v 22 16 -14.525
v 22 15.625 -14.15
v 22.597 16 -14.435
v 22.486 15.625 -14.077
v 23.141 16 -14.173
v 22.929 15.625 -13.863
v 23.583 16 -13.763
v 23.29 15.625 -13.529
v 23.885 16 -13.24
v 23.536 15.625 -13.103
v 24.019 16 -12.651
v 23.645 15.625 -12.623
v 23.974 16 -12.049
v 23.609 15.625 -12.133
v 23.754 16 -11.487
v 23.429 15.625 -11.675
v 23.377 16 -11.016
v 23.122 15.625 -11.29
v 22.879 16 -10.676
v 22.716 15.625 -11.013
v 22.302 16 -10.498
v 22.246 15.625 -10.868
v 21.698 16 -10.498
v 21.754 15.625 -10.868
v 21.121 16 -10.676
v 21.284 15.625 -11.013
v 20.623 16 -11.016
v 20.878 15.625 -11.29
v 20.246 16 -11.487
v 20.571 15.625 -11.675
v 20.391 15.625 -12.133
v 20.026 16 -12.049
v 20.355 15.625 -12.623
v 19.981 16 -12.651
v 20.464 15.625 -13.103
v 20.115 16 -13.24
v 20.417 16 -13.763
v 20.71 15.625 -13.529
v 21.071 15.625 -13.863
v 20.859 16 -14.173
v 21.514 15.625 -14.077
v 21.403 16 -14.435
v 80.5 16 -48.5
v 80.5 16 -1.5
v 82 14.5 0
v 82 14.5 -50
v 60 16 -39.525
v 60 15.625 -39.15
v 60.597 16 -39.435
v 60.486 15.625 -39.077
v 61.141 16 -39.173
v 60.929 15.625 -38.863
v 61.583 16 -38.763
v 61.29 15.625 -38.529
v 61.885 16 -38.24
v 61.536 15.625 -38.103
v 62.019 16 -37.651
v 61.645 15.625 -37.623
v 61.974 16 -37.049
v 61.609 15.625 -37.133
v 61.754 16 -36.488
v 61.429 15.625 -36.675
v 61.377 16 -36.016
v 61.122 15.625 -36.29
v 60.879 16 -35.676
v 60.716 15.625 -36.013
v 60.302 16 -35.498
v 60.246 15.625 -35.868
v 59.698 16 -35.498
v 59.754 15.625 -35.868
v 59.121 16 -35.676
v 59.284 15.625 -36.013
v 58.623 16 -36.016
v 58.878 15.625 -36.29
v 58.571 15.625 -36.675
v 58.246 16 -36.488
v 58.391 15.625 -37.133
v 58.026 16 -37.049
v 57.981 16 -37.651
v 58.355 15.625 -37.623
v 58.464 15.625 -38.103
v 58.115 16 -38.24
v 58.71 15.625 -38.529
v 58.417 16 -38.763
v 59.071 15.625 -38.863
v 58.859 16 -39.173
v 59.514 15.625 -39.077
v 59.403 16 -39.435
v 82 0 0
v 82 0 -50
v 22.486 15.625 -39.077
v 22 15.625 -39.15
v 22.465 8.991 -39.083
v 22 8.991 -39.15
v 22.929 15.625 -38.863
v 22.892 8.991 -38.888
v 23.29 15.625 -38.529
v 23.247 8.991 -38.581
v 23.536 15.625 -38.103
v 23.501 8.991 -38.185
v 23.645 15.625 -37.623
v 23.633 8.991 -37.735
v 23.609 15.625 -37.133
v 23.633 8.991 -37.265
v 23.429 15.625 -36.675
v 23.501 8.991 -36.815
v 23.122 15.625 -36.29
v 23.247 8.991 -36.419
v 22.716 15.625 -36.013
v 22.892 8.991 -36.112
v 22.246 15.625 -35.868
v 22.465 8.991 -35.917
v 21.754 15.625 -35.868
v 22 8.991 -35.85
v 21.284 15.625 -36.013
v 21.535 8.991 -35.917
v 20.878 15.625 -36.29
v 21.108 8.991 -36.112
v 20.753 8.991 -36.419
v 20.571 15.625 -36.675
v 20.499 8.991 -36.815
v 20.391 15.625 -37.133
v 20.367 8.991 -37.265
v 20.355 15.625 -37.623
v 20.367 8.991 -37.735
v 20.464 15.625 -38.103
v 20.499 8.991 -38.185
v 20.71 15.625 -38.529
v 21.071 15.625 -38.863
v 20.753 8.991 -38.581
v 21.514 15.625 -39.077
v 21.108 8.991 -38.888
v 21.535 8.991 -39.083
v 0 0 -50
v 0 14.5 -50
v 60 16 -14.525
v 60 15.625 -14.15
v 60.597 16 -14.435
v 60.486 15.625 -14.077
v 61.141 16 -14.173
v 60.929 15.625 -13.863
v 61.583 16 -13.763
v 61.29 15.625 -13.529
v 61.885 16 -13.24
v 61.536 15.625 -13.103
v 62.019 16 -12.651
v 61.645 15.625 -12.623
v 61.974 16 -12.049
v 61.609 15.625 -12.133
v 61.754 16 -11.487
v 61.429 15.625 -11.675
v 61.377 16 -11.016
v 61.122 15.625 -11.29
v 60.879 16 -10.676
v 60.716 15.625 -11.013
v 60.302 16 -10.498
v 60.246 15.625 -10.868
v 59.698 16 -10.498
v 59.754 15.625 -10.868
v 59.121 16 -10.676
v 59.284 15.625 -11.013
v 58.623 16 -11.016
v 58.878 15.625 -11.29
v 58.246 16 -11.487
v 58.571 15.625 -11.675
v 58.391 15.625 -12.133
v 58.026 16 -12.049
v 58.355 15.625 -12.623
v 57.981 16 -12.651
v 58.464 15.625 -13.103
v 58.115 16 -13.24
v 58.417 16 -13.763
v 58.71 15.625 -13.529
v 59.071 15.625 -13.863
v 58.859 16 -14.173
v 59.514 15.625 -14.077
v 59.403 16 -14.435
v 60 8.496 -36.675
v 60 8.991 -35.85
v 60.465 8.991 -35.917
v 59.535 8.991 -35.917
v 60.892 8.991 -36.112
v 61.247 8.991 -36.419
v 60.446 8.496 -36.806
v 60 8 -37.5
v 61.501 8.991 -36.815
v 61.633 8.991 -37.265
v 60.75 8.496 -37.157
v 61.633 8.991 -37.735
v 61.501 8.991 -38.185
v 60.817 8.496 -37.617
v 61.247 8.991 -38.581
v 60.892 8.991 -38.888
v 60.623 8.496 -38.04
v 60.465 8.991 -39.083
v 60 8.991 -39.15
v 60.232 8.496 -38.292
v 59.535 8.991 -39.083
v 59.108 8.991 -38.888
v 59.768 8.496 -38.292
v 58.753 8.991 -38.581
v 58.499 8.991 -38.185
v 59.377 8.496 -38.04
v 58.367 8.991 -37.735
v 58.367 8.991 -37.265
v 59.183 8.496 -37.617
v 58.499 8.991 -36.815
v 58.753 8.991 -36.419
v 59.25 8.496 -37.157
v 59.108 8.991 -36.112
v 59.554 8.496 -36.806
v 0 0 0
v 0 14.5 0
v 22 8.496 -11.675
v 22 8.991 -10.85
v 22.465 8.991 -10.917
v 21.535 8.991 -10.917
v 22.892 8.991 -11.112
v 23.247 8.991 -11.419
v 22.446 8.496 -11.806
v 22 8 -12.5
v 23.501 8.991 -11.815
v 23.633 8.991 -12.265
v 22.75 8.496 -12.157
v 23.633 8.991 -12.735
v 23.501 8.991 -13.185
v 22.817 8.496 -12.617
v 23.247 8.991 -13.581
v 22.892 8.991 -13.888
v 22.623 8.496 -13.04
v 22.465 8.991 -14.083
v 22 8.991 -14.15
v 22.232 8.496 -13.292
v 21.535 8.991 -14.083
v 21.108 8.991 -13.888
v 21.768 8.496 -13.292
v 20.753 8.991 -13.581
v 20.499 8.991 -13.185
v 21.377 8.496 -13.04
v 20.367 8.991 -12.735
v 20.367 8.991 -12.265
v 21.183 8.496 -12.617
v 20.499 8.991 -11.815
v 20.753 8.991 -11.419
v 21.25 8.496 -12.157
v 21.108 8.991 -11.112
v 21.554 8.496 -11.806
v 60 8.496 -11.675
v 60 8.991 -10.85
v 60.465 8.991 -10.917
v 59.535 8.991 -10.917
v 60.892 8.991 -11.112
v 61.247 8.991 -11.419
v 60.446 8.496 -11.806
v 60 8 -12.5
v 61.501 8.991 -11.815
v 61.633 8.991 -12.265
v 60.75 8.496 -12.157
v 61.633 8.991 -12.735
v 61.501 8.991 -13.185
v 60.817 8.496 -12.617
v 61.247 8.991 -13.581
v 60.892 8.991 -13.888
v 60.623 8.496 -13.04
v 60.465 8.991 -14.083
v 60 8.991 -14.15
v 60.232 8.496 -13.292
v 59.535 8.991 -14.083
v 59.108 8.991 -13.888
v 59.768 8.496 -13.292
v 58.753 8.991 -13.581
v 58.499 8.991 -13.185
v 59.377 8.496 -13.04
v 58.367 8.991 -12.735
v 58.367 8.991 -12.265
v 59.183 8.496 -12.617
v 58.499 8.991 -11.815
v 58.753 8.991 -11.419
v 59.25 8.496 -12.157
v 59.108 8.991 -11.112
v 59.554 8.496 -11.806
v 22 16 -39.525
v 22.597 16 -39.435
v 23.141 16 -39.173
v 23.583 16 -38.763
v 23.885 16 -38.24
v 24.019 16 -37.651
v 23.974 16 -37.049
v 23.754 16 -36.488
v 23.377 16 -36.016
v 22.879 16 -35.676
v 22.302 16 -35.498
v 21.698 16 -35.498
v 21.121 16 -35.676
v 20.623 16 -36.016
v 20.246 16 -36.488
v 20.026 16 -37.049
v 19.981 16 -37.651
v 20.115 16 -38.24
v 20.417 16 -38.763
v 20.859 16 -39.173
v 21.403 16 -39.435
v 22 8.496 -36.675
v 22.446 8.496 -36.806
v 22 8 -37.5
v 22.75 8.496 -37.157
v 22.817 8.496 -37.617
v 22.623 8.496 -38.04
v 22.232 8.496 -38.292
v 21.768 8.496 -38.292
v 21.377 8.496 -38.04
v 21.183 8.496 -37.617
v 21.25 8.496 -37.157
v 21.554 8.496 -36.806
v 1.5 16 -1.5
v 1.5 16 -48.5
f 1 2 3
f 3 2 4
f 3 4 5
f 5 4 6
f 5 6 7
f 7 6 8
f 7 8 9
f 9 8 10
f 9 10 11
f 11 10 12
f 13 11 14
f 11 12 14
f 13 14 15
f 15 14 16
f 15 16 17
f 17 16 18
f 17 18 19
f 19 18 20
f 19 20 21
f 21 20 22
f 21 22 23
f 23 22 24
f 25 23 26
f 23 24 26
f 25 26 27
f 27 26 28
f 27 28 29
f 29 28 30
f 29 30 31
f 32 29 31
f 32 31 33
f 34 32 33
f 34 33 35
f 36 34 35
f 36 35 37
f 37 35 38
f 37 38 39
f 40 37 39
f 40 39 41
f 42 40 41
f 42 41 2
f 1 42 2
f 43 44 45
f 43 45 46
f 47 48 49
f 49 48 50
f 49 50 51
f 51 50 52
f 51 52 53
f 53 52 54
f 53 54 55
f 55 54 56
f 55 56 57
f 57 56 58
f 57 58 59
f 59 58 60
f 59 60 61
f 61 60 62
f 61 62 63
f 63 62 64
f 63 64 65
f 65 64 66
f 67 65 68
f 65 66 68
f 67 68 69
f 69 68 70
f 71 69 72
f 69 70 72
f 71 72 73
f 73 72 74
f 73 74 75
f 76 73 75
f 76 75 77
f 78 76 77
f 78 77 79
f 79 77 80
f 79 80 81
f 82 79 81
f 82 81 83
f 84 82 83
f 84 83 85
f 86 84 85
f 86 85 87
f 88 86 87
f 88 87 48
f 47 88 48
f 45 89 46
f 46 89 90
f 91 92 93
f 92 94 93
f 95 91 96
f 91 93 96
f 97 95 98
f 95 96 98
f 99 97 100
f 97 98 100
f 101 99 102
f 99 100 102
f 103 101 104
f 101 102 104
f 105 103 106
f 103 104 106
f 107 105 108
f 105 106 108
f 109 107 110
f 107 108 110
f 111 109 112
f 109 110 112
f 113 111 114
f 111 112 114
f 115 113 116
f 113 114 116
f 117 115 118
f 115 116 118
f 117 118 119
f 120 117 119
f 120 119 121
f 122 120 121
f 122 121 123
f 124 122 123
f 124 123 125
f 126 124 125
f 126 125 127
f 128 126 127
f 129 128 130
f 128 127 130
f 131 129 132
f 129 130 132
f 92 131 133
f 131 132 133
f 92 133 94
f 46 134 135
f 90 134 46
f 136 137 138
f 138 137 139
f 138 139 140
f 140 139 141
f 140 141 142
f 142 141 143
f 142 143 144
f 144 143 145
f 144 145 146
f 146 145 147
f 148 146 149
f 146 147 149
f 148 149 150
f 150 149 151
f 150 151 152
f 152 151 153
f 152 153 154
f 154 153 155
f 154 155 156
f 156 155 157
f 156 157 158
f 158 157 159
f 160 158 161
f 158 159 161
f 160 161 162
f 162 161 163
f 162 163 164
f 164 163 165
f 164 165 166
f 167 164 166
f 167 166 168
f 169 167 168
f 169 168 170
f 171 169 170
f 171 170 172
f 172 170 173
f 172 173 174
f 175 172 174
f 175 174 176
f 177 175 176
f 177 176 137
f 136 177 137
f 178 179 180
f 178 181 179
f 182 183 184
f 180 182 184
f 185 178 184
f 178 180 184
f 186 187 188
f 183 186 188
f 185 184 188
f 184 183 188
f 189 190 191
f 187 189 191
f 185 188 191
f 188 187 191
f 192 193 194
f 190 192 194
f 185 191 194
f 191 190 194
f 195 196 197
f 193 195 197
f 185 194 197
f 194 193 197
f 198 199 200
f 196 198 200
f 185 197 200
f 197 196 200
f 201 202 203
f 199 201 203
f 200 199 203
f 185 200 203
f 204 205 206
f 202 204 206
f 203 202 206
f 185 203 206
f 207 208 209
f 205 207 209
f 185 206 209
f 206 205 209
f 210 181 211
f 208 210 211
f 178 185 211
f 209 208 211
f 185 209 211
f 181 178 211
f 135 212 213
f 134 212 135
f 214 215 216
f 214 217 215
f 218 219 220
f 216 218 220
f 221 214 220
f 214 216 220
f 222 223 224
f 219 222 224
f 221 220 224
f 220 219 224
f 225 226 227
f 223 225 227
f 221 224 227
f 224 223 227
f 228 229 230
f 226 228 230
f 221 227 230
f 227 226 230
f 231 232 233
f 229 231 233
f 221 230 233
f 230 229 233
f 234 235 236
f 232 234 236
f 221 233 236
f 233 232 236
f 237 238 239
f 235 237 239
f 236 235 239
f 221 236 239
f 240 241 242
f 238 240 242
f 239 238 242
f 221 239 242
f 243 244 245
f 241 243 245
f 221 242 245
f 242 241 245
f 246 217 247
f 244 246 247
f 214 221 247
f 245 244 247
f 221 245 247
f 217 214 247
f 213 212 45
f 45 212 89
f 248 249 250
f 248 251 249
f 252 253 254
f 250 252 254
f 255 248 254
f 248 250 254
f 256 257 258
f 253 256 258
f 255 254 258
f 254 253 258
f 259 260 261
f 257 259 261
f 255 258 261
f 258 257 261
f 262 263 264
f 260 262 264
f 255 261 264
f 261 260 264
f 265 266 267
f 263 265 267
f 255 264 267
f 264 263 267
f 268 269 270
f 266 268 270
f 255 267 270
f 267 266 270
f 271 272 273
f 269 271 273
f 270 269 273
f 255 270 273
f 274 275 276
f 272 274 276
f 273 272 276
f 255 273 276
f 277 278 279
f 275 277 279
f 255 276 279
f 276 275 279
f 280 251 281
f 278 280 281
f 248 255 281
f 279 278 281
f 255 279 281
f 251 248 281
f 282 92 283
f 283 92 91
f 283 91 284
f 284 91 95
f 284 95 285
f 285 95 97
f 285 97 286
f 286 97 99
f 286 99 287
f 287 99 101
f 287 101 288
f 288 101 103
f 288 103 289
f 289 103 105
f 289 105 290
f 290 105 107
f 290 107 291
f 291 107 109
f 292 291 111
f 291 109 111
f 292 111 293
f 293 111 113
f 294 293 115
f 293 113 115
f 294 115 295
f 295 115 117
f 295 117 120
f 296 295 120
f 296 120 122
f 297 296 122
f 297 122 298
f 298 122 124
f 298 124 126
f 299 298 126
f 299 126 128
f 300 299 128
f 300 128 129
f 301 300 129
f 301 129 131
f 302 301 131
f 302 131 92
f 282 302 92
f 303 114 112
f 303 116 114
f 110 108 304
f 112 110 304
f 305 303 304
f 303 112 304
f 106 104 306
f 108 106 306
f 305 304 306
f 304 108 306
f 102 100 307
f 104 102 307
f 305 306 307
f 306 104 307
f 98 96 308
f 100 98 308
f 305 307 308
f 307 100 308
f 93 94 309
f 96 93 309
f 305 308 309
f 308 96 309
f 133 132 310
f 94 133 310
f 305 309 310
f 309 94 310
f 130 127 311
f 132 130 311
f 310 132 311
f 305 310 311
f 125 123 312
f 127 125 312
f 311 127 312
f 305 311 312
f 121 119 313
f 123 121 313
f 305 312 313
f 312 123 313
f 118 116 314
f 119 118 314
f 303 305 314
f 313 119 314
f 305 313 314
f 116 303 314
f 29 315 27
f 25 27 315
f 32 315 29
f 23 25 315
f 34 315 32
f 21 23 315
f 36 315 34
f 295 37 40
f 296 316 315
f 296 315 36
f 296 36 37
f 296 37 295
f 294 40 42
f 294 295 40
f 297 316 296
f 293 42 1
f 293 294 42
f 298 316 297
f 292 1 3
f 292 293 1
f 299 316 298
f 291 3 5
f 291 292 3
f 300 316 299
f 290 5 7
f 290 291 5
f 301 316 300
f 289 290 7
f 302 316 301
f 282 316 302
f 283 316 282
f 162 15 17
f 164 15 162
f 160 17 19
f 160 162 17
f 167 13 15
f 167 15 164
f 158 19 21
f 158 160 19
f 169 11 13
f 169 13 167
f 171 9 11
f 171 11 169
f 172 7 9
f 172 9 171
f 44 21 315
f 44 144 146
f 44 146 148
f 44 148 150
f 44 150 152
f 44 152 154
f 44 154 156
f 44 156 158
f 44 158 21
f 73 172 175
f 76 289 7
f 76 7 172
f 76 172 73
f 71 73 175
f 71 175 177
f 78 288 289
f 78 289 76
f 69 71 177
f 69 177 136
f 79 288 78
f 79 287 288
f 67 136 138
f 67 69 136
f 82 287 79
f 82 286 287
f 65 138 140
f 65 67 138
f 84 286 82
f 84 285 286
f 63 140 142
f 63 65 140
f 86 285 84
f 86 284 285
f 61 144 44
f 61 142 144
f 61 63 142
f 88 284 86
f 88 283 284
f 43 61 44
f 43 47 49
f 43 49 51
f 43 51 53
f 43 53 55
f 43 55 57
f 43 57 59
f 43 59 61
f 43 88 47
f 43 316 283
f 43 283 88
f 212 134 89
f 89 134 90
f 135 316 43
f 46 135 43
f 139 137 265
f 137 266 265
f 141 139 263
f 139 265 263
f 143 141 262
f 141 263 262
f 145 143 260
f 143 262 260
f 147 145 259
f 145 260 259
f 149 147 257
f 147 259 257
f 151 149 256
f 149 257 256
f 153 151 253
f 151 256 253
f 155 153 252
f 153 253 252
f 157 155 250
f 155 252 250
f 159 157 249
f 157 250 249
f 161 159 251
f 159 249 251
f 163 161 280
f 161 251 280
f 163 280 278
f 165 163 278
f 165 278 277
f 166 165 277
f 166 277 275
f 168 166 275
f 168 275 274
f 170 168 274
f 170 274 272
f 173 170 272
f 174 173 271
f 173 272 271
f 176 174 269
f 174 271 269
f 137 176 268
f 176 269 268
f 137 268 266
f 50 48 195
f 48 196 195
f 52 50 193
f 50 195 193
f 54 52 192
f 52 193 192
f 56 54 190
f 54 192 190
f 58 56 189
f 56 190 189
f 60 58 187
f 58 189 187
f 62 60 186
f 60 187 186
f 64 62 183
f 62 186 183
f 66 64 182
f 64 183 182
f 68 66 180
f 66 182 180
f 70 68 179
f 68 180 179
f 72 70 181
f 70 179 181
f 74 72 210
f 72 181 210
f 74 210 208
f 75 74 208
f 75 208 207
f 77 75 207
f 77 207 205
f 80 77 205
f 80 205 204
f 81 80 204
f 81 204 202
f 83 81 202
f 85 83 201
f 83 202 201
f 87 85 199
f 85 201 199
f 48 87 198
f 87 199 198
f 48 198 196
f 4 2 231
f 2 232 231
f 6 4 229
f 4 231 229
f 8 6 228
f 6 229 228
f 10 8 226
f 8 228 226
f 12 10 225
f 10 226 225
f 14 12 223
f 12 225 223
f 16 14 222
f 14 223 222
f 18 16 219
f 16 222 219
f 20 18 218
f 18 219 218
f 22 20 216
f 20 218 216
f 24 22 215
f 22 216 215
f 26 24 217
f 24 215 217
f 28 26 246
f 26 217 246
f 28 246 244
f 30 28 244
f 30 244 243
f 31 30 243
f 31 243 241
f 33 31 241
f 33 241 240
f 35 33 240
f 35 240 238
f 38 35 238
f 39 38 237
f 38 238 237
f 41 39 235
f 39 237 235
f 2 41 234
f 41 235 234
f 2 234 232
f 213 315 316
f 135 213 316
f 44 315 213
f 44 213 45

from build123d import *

# Parameters (mm, degrees)
SKETCH_1_W                  = 82
SKETCH_1_H                  = 50
EXTRUDE_1_DEPTH             = 16
CHAMFER_1_SIZE              = 1.5
HOLE_WIZARD_M41_D           = 3.3
HOLE_WIZARD_M41_DEPTH       = 7.008579979
HOLE_WIZARD_M41_CSINK_D     = 4.05
HOLE_WIZARD_M41_CSINK_ANGLE = 90
HOLE_WIZARD_M41_TIP         = 0.991420021


with BuildPart() as part:
    # Эскиз1 → Бобышка-Вытянуть1 (new body)
    with BuildSketch(Plane(origin=(0, 0, 0), x_dir=(1, 0, 0), z_dir=(0, 1, 0))):
        with Locations((41, 25)):
            Rectangle(SKETCH_1_W, SKETCH_1_H)
    extrude(amount=EXTRUDE_1_DEPTH)

    # Фаска1
    chamfer_1_edges = [part.edges().sort_by_distance(p)[0] for p in [
        (82, 16, -25),
        (41, 16, -50),
        (0, 16, -25),
        (41, 16, 0),
    ]]
    chamfer(chamfer_1_edges, length=CHAMFER_1_SIZE)

    # Отверстие обработанное метчиком M41
    with Locations(Plane(origin=(22, 16, -37.5), x_dir=(0, 0, 1), z_dir=(0, 1, 0))):
        with Locations((0, 0), (25, 0), (0, 38), (25, 38)):
            CounterSinkHole(HOLE_WIZARD_M41_D / 2, HOLE_WIZARD_M41_CSINK_D / 2, depth=HOLE_WIZARD_M41_DEPTH, counter_sink_angle=HOLE_WIZARD_M41_CSINK_ANGLE)
            with Locations((0, 0, -(HOLE_WIZARD_M41_DEPTH + HOLE_WIZARD_M41_TIP / 2))):  # 118° drill point
                Cone(0, HOLE_WIZARD_M41_D / 2, HOLE_WIZARD_M41_TIP, mode=Mode.SUBTRACT)


solid = part.part
